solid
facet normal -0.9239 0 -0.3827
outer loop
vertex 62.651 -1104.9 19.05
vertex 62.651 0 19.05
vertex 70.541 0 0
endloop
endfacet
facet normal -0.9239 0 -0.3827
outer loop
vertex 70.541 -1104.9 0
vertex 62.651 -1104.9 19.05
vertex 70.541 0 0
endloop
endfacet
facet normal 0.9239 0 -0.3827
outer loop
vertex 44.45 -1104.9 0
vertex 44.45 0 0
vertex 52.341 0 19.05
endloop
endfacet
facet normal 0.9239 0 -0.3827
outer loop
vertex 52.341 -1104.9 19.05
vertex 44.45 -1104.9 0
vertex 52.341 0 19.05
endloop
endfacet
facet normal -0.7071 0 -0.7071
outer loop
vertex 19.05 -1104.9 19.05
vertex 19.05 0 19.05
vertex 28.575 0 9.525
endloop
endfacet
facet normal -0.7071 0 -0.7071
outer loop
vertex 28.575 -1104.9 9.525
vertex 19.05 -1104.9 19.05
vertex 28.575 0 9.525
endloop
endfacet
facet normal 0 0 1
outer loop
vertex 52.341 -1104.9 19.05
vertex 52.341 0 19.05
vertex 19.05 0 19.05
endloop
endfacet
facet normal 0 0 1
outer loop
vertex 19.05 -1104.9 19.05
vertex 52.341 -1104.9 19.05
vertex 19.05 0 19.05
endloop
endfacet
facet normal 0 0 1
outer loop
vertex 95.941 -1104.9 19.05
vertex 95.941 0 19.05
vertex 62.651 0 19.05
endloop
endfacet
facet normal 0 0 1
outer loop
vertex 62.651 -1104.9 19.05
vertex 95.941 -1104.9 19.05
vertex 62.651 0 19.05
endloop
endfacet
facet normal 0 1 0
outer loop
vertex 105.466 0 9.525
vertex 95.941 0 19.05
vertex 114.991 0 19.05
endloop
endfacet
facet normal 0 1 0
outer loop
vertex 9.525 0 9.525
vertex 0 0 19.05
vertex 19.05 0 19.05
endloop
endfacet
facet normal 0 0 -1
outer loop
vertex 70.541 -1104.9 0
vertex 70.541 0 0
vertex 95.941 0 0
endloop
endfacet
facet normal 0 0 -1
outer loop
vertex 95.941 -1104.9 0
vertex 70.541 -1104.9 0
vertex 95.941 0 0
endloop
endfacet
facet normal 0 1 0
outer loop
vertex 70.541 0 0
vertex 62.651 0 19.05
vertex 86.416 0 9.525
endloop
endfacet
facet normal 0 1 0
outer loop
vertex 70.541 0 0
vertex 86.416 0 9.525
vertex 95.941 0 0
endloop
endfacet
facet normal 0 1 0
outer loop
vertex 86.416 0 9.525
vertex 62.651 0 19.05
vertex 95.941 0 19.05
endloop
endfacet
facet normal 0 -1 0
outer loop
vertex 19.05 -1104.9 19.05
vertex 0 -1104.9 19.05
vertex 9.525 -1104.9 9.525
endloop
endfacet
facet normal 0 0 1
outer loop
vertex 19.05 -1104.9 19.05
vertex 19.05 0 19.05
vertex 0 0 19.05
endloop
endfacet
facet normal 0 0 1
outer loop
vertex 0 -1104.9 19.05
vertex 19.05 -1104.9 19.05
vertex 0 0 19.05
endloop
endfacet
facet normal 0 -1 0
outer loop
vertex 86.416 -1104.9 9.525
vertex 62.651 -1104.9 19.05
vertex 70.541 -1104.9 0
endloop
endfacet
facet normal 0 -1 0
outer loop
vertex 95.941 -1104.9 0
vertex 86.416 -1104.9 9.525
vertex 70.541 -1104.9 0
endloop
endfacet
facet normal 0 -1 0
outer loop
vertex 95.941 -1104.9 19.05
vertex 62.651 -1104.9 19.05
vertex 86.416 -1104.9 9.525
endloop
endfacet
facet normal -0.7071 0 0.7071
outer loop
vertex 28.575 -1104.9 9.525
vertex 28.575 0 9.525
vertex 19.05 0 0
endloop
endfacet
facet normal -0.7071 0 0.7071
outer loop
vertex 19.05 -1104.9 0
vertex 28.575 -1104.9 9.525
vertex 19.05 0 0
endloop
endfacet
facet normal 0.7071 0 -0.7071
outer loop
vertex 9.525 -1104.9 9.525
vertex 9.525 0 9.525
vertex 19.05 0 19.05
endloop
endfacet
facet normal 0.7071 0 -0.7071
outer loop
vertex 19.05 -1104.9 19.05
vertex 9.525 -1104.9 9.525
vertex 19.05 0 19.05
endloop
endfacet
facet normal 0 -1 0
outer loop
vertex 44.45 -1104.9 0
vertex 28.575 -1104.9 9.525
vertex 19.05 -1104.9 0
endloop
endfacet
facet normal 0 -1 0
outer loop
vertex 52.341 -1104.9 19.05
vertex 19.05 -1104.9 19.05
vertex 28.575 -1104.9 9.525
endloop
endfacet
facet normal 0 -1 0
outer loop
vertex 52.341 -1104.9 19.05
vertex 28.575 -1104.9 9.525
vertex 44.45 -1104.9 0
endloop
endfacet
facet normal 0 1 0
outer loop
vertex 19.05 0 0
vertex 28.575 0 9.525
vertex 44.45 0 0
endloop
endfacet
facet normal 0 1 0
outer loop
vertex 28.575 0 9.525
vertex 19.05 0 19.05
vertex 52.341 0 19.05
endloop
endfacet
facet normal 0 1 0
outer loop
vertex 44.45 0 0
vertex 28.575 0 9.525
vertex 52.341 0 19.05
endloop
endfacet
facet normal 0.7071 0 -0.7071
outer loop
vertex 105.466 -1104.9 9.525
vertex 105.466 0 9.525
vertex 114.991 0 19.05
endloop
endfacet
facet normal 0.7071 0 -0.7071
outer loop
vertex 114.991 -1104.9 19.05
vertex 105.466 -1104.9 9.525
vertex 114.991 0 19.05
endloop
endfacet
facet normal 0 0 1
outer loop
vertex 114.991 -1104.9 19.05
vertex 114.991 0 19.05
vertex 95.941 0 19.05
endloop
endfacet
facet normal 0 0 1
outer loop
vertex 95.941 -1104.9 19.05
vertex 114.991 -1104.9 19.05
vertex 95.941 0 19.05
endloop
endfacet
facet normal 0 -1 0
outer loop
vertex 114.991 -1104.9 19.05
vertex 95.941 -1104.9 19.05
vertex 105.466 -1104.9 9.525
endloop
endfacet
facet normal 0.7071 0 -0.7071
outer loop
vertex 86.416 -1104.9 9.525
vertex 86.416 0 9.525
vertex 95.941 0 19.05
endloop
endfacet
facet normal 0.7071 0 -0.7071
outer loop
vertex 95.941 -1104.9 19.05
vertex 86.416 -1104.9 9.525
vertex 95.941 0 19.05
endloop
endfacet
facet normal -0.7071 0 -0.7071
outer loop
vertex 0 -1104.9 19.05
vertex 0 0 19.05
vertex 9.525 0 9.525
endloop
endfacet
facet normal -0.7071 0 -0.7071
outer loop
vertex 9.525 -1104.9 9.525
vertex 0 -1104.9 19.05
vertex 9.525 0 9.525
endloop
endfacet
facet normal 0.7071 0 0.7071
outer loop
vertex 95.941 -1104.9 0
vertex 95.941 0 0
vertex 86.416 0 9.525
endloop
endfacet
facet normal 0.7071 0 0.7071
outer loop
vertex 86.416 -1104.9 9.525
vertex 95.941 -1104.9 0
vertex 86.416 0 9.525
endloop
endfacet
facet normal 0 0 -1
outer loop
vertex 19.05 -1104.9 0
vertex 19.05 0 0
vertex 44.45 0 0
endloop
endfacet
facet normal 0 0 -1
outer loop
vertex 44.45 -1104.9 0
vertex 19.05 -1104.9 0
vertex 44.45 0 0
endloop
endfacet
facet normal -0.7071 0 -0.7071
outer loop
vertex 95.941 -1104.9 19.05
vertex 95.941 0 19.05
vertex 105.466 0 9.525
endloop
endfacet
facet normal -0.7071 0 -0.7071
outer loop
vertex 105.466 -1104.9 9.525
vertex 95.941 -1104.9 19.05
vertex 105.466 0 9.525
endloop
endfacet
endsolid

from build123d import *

# Parameters (mm, degrees)
F1_DEPTH = 1104.9


with BuildPart() as f1:
    # F0 (on Front) → F1 (new body)
    with BuildSketch(Plane.XZ):
        Polygon((28.575, 9.525), (19.05, 0), (44.45, 0), (52.340768, 19.05), (19.05, 19.05), align=None)
        Polygon((9.525, 9.525), (19.05, 19.05), (0, 19.05), align=None)
        Polygon((105.466322, 9.525), (114.991322, 19.05), (95.941322, 19.05), align=None)
        Polygon((86.416322, 9.525), (95.941322, 19.05), (62.650554, 19.05), (70.541322, 0), (95.941322, 0), align=None)
    extrude(amount=F1_DEPTH)


solid = f1.part
